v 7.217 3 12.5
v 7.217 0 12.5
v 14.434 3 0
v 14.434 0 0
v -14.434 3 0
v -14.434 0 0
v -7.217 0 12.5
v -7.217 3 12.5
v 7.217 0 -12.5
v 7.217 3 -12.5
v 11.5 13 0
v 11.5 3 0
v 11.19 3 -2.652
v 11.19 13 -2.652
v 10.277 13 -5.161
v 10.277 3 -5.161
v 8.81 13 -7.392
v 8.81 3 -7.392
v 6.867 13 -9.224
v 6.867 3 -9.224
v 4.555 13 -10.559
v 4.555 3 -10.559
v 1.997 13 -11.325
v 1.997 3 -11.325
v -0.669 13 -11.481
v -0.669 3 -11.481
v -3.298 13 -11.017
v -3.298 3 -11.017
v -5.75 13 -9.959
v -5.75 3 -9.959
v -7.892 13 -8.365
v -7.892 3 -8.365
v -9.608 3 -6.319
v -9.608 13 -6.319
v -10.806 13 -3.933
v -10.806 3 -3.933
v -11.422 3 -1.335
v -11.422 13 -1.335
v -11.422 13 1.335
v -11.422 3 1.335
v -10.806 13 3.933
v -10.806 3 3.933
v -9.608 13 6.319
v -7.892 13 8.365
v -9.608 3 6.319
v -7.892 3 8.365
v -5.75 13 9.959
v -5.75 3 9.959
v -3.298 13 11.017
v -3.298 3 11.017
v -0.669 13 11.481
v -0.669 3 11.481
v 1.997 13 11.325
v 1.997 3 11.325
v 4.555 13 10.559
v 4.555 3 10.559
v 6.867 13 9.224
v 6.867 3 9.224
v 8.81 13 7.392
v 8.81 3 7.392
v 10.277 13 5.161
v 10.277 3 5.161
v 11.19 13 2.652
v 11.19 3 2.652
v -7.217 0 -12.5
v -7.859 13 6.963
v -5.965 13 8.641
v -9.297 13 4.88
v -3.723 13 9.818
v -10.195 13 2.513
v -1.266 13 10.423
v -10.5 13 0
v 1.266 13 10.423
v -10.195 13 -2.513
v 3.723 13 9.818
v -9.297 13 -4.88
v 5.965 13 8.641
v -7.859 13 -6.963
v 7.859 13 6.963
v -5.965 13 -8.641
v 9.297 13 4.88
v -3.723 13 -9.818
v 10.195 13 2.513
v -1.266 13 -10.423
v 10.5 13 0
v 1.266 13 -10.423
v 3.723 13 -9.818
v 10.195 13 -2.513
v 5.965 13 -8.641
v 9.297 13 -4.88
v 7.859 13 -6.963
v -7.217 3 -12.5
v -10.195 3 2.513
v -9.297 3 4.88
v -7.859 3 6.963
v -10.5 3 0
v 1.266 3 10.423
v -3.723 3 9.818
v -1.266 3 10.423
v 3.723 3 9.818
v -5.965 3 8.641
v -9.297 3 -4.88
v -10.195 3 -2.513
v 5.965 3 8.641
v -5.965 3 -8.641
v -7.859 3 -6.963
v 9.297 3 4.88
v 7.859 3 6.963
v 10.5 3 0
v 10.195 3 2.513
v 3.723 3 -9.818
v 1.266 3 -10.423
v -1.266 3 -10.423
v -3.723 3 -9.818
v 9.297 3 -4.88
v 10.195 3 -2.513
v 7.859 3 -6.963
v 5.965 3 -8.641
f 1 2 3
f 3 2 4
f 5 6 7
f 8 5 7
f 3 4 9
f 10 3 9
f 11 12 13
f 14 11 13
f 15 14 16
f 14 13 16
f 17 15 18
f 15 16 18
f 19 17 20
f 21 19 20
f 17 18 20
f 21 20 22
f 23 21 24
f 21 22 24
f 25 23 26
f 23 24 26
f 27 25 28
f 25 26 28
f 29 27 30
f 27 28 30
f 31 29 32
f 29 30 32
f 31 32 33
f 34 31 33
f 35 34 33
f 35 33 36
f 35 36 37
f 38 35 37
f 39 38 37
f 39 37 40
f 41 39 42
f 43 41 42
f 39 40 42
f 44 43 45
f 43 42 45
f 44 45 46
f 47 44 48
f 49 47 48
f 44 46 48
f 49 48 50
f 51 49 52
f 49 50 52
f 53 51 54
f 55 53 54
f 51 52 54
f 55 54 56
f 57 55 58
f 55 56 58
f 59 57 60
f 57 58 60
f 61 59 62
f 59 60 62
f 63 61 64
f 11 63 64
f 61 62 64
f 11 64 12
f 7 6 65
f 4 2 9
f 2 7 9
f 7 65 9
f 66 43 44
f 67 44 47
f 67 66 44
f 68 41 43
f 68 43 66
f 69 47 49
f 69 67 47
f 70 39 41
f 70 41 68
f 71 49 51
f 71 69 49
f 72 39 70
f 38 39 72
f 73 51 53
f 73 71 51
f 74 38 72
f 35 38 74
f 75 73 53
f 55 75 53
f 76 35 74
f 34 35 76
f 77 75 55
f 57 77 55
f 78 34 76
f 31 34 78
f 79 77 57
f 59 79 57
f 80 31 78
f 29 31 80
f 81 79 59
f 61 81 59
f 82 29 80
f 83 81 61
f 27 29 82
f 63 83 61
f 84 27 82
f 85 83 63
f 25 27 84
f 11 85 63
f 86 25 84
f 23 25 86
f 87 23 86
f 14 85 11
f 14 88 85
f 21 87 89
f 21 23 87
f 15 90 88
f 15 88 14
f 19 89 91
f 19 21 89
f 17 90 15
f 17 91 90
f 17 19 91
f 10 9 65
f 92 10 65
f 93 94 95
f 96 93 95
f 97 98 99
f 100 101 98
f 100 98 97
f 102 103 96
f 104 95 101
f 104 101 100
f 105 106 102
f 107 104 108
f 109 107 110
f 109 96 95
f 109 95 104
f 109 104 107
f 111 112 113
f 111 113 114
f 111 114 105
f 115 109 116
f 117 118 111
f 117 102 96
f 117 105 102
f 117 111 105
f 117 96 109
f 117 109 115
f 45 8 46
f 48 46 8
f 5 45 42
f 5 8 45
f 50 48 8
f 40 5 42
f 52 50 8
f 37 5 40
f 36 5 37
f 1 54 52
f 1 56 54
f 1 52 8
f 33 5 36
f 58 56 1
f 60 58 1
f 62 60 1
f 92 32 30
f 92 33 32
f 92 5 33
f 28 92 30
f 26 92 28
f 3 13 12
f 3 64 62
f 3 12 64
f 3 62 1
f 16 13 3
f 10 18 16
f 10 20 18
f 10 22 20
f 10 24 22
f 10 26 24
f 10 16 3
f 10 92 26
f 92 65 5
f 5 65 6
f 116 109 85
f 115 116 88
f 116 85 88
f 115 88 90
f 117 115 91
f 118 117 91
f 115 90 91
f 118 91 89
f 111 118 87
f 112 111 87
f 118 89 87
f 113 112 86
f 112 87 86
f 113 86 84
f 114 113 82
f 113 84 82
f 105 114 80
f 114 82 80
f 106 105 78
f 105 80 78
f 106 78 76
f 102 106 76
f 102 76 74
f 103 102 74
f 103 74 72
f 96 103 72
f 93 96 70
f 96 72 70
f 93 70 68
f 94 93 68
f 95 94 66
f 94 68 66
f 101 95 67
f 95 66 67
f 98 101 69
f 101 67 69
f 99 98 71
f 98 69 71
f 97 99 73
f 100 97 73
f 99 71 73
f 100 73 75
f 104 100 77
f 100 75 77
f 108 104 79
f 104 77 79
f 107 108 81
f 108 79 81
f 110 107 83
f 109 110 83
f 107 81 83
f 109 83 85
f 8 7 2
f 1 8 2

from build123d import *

# Parameters (mm, degrees)
BOSS_EXTRUDE1_DEPTH = 3
SKETCH2_R           = 11.5
BOSS_EXTRUDE2_DEPTH = 10
SKETCH3_R           = 10.5
CUT_EXTRUDE1_DEPTH  = 10


with BuildPart() as part:
    # Sketch1 → Boss-Extrude1 (new body)
    with BuildSketch(Plane(origin=(0, 0, 0), x_dir=(1, 0, 0), z_dir=(0, 1, 0))):
        Polygon((7.216878365, -12.5), (14.43375673, 0), (7.216878365, 12.5), (-7.216878365, 12.5), (-14.43375673, 0), (-7.216878365, -12.5), align=None)
    extrude(amount=BOSS_EXTRUDE1_DEPTH)

    # Sketch2 → Boss-Extrude2 (add)
    with BuildSketch(Plane(origin=(0, 3, 0), x_dir=(1, 0, 0), z_dir=(0, 1, 0))):
        Circle(SKETCH2_R)
    extrude(amount=BOSS_EXTRUDE2_DEPTH)

    # Sketch3 → Cut-Extrude1 (cut)
    with BuildSketch(Plane(origin=(0, 13, 0), x_dir=(1, 0, 0), z_dir=(0, 1, 0))):
        Circle(SKETCH3_R)
    extrude(amount=-CUT_EXTRUDE1_DEPTH, mode=Mode.SUBTRACT)


solid = part.part
